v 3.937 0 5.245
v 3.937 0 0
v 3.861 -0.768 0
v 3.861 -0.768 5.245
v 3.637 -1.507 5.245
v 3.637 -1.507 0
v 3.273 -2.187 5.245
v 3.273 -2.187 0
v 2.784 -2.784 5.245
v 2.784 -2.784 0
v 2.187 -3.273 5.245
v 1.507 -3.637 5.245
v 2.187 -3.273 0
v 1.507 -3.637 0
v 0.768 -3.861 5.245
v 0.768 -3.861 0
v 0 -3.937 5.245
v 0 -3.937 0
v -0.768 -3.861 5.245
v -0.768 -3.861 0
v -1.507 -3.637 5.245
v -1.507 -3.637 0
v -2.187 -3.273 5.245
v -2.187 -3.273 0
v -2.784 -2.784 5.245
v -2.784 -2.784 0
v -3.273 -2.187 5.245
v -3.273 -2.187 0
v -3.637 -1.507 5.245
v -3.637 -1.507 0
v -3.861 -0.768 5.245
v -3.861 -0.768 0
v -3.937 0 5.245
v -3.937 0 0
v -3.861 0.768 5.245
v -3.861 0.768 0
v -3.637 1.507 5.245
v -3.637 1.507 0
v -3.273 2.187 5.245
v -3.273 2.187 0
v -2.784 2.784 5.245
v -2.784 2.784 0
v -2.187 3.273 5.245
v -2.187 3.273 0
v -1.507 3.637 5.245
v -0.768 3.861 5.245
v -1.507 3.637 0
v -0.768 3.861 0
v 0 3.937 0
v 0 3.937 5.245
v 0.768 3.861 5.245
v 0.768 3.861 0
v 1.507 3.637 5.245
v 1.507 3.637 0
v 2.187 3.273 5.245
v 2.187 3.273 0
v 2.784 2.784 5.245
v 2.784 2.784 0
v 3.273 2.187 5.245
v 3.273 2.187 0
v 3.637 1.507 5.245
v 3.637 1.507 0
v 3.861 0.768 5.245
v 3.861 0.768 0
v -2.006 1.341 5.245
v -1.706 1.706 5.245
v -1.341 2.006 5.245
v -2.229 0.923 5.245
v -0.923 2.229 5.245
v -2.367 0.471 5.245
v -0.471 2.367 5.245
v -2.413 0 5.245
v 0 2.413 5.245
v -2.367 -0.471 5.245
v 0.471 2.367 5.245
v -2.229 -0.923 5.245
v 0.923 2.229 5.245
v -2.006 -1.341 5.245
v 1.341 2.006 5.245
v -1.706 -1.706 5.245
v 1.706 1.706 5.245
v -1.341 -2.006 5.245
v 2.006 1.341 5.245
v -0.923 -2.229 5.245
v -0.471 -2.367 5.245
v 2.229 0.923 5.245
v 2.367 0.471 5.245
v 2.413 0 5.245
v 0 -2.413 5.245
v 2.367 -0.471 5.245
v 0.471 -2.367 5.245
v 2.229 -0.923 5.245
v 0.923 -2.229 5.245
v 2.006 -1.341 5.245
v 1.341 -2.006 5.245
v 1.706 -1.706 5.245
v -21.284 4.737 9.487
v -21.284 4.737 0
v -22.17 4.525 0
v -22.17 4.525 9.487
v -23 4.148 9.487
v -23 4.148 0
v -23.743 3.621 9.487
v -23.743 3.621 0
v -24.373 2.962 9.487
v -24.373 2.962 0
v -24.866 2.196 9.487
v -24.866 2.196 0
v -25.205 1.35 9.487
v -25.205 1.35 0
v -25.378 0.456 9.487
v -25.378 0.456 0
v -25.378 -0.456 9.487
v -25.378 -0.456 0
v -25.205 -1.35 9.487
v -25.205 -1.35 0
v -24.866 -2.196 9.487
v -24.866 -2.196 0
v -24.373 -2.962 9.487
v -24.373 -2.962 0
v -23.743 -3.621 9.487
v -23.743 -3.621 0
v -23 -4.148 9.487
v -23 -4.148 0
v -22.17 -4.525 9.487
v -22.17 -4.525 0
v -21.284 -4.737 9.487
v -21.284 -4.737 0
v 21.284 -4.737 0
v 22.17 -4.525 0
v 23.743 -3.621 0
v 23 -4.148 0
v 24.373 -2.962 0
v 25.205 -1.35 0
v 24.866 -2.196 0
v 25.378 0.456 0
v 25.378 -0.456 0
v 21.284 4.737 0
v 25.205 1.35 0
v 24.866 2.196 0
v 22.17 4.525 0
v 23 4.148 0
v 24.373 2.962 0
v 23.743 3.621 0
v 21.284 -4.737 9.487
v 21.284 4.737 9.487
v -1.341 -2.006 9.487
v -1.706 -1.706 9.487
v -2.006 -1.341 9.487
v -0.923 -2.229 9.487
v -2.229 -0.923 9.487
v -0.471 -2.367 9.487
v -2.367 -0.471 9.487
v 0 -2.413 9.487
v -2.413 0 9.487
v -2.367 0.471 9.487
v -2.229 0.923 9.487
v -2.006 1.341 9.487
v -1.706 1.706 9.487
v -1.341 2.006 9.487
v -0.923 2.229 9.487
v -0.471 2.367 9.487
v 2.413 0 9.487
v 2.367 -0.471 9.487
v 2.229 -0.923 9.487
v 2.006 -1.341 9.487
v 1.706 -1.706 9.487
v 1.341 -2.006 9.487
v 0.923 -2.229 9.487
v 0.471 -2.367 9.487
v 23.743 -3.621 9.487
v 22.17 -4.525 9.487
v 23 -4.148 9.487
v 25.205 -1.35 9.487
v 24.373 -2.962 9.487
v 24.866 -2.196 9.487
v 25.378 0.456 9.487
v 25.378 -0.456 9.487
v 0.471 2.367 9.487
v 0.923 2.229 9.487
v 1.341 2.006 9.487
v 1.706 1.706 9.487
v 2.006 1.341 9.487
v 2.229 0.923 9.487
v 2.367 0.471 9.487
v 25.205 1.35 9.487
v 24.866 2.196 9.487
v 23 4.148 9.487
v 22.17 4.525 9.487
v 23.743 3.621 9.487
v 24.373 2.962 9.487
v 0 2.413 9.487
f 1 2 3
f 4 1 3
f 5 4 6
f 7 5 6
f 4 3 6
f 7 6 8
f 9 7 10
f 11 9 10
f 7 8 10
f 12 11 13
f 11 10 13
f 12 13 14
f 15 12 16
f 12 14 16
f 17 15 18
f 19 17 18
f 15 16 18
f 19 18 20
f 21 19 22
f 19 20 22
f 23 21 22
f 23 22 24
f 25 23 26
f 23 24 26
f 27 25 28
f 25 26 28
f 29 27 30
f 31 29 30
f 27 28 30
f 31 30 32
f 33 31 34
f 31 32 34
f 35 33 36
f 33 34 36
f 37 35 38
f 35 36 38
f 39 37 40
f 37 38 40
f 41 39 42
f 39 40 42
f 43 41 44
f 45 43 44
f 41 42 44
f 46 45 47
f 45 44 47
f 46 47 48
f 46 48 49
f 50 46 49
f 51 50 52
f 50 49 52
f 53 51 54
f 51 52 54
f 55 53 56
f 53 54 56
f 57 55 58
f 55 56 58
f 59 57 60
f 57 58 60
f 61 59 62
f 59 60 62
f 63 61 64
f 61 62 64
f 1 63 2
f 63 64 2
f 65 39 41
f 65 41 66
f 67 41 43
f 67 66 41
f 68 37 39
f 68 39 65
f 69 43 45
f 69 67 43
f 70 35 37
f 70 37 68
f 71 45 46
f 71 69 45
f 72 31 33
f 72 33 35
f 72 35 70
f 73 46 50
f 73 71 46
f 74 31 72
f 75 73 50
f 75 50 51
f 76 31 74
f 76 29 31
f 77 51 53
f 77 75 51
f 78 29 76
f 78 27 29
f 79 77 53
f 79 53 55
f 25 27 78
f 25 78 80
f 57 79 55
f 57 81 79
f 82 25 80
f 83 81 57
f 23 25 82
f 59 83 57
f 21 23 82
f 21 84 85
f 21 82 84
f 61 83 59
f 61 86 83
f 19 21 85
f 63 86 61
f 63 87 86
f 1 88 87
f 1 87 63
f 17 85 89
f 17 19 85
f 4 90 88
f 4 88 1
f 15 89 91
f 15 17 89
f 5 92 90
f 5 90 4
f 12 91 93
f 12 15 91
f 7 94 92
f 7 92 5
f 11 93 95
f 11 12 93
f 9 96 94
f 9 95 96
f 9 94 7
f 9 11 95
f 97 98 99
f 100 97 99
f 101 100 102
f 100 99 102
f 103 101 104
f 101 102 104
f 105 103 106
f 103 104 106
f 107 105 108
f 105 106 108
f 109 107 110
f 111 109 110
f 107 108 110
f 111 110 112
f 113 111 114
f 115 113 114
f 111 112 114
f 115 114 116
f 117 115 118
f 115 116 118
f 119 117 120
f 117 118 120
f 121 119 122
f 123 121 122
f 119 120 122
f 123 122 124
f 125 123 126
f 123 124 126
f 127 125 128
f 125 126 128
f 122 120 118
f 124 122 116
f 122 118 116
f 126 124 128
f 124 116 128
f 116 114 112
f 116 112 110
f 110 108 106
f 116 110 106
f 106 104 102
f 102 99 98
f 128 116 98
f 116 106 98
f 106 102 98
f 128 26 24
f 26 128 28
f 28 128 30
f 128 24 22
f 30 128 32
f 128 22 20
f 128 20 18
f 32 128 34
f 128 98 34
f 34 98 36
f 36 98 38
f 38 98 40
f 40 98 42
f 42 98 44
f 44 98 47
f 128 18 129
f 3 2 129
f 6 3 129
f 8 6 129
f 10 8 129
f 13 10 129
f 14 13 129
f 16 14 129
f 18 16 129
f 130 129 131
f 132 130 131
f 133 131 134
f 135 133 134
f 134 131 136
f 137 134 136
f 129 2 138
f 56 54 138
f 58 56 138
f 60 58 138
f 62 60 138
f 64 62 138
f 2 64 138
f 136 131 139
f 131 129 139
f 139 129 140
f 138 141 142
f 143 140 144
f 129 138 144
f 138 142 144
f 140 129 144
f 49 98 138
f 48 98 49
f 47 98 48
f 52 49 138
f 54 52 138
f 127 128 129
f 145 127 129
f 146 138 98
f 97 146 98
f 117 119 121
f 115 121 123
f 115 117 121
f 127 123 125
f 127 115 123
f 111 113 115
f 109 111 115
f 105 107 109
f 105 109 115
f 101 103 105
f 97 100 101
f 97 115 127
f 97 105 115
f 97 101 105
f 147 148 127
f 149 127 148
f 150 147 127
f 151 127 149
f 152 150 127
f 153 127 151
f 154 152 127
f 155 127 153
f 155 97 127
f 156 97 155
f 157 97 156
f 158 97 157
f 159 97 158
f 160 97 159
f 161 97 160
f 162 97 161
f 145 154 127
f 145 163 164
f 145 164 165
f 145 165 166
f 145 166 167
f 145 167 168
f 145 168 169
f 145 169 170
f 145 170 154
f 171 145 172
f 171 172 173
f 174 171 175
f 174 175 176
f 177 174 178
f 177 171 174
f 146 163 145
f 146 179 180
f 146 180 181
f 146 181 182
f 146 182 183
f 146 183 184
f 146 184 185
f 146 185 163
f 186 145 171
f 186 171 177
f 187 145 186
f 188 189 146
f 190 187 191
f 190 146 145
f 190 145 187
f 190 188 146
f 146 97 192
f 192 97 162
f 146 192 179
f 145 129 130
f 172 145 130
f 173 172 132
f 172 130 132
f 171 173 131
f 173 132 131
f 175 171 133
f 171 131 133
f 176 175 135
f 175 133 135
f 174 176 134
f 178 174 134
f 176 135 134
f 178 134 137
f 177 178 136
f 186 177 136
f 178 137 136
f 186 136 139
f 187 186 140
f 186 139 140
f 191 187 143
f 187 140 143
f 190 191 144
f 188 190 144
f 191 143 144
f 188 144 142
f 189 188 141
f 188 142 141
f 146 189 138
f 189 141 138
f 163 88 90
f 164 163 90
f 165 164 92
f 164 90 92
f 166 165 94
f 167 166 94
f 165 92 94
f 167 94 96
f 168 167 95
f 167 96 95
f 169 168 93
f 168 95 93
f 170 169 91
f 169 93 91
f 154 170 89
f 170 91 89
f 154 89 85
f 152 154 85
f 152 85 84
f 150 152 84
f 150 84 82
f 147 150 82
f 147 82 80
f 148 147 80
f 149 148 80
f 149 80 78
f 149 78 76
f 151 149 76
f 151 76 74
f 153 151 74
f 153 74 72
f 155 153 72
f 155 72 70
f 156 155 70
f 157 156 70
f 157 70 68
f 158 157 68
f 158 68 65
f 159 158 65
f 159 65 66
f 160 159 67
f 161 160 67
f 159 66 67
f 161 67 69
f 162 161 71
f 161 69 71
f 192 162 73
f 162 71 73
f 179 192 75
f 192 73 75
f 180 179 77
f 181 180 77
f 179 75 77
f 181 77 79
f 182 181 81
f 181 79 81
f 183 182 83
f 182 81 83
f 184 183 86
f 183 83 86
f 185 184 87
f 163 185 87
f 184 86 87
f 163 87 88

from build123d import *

# Parameters (mm, degrees)
F1_DEPTH = 9.4869
F2_R     = 3.937
F3_DEPTH = 5.2451
F4_R     = 2.413
F5_DEPTH = 4.2428


with BuildPart() as f1:
    # F0 (on Top) → F1 (new body)
    with BuildSketch(Plane.XY):
        with BuildLine():
            Line((21.283937, 4.7371), (-21.283937, 4.7371))
            ThreePointArc((-21.283937, 4.7371), (-25.4, 0), (-21.283937, -4.7371))
            Line((-21.283937, -4.7371), (21.283937, -4.7371))
            ThreePointArc((21.283937, -4.7371), (25.4, 0), (21.283937, 4.7371))
        make_face()
    extrude(amount=F1_DEPTH)

    # F2 (on face) → F3 (cut)
    with BuildSketch(Plane(origin=(0, 0, 0), x_dir=(1, 0, 0), z_dir=(0, 0, -1))):
        Circle(F2_R)
    extrude(amount=-F3_DEPTH, mode=Mode.SUBTRACT)

    # F4 (on face) → F5 (cut, through all)
    with BuildSketch(Plane(origin=(0, 0, 5.2451), x_dir=(1, 0, 0), z_dir=(0, 0, -1))):
        Circle(F4_R)
    extrude(amount=-F5_DEPTH, mode=Mode.SUBTRACT)


solid = f1.part
